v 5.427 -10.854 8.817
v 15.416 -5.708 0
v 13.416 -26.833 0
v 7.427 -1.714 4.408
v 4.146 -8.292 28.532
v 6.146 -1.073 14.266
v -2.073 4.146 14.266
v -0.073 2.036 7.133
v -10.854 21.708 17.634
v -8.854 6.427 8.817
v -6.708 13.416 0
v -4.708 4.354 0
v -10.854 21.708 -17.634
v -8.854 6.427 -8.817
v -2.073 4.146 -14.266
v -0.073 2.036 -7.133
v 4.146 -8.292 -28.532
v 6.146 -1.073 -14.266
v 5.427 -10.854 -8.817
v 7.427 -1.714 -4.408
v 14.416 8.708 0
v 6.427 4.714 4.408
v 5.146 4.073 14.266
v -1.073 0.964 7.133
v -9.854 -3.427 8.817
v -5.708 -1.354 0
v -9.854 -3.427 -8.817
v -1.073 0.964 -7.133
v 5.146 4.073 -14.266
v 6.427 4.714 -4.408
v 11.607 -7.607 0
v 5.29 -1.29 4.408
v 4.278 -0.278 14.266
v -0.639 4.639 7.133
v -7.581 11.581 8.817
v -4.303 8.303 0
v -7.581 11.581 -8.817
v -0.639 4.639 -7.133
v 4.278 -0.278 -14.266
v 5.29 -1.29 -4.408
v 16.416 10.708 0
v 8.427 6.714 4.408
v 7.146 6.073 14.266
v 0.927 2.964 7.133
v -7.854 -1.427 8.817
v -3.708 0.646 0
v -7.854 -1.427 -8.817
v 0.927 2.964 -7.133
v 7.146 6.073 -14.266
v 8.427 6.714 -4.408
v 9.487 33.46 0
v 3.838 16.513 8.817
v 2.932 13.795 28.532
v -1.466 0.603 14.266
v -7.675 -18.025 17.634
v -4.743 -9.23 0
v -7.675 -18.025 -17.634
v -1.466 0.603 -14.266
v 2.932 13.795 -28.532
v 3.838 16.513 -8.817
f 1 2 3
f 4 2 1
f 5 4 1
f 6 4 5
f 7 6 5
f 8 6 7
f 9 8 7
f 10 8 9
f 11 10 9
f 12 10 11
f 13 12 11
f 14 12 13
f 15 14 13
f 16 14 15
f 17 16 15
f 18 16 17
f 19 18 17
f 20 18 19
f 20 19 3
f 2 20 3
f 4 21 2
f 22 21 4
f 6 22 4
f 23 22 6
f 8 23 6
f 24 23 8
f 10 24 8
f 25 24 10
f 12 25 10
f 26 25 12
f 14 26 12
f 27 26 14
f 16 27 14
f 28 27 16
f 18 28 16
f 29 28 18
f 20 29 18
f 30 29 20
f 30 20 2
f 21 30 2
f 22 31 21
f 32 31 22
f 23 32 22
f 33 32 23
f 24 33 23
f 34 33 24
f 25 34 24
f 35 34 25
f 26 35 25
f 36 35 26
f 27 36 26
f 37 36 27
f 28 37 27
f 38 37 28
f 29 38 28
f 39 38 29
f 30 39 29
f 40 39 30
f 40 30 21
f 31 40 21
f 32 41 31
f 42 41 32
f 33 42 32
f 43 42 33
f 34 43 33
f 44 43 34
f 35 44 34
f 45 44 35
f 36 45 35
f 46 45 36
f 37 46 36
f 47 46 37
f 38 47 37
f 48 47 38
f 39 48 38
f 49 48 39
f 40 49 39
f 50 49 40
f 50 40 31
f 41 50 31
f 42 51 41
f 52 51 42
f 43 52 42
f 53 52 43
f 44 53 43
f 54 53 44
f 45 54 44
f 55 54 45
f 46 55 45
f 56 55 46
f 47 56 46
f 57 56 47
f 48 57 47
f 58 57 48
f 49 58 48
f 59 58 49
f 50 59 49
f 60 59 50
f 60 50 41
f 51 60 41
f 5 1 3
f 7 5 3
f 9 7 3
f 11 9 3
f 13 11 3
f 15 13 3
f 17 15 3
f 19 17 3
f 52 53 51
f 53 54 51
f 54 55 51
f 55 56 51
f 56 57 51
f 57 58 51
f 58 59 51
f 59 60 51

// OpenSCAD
polyhedron(faces = [[0, 10, 1], [1, 10, 11], [1, 11, 2], [2, 11, 12], [2, 12, 3], [3, 12, 13], [3, 13, 4], [4, 13, 14], [4, 14, 5], [5, 14, 15], [5, 15, 6], [6, 15, 16], [6, 16, 7], [7, 16, 17], [7, 17, 8], [8, 17, 18], [8, 18, 9], [9, 18, 19], [0, 9, 19], [0, 19, 10], [10, 20, 11], [11, 20, 21], [11, 21, 12], [12, 21, 22], [12, 22, 13], [13, 22, 23], [13, 23, 14], [14, 23, 24], [14, 24, 15], [15, 24, 25], [15, 25, 16], [16, 25, 26], [16, 26, 17], [17, 26, 27], [17, 27, 18], [18, 27, 28], [18, 28, 19], [19, 28, 29], [10, 19, 29], [10, 29, 20], [20, 30, 21], [21, 30, 31], [21, 31, 22], [22, 31, 32], [22, 32, 23], [23, 32, 33], [23, 33, 24], [24, 33, 34], [24, 34, 25], [25, 34, 35], [25, 35, 26], [26, 35, 36], [26, 36, 27], [27, 36, 37], [27, 37, 28], [28, 37, 38], [28, 38, 29], [29, 38, 39], [20, 29, 39], [20, 39, 30], [30, 40, 31], [31, 40, 41], [31, 41, 32], [32, 41, 42], [32, 42, 33], [33, 42, 43], [33, 43, 34], [34, 43, 44], [34, 44, 35], [35, 44, 45], [35, 45, 36], [36, 45, 46], [36, 46, 37], [37, 46, 47], [37, 47, 38], [38, 47, 48], [38, 48, 39], [39, 48, 49], [30, 39, 49], [30, 49, 40], [40, 50, 41], [41, 50, 51], [41, 51, 42], [42, 51, 52], [42, 52, 43], [43, 52, 53], [43, 53, 44], [44, 53, 54], [44, 54, 45], [45, 54, 55], [45, 55, 46], [46, 55, 56], [46, 56, 47], [47, 56, 57], [47, 57, 48], [48, 57, 58], [48, 58, 49], [49, 58, 59], [40, 49, 59], [40, 59, 50], [0, 1, 2], [0, 2, 3], [0, 3, 4], [0, 4, 5], [0, 5, 6], [0, 6, 7], [0, 7, 8], [0, 8, 9], [50, 52, 51], [50, 53, 52], [50, 54, 53], [50, 55, 54], [50, 56, 55], [50, 57, 56], [50, 58, 57], [50, 59, 58]], points = [[13.4164078650, -26.8328157300, 0.0000000000], [5.4270509831, -10.8541019662, 8.8167787844], [4.1458980338, -8.2917960675, 28.5316954889], [-2.0729490169, 4.1458980338, 14.2658477444], [-10.8541019662, 21.7082039325, 17.6335575688], [-6.7082039325, 13.4164078650, 0.0000000000], [-10.8541019662, 21.7082039325, -17.6335575688], [-2.0729490169, 4.1458980338, -14.2658477444], [4.1458980338, -8.2917960675, -28.5316954889], [5.4270509831, -10.8541019662, -8.8167787844], [15.4164078650, -5.7082039325, 0.0000000000], [7.4270509831, -1.7135254916, 4.4083893922], [6.1458980338, -1.0729490169, 14.2658477444], [-0.0729490169, 2.0364745084, 7.1329238722], [-8.8541019662, 6.4270509831, 8.8167787844], [-4.7082039325, 4.3541019662, 0.0000000000], [-8.8541019662, 6.4270509831, -8.8167787844], [-0.0729490169, 2.0364745084, -7.1329238722], [6.1458980338, -1.0729490169, -14.2658477444], [7.4270509831, -1.7135254916, -4.4083893922], [14.4164078650, 8.7082039325, 0.0000000000], [6.4270509831, 4.7135254916, 4.4083893922], [5.1458980338, 4.0729490169, 14.2658477444], [-1.0729490169, 0.9635254916, 7.1329238722], [-9.8541019662, -3.4270509831, 8.8167787844], [-5.7082039325, -1.3541019662, 0.0000000000], [-9.8541019662, -3.4270509831, -8.8167787844], [-1.0729490169, 0.9635254916, -7.1329238722], [5.1458980338, 4.0729490169, -14.2658477444], [6.4270509831, 4.7135254916, -4.4083893922], [11.6066017178, -7.6066017178, 0.0000000000], [5.2904605211, -1.2904605211, 4.4083893922], [4.2776201834, -0.2776201834, 14.2658477444], [-0.6388100917, 4.6388100917, 7.1329238722], [-7.5809210423, 11.5809210423, 8.8167787844], [-4.3033008589, 8.3033008589, 0.0000000000], [-7.5809210423, 11.5809210423, -8.8167787844], [-0.6388100917, 4.6388100917, -7.1329238722], [4.2776201834, -0.2776201834, -14.2658477444], [5.2904605211, -1.2904605211, -4.4083893922], [16.4164078650, 10.7082039325, 0.0000000000], [8.4270509831, 6.7135254916, 4.4083893922], [7.1458980338, 6.0729490169, 14.2658477444], [0.9270509831, 2.9635254916, 7.1329238722], [-7.8541019662, -1.4270509831, 8.8167787844], [-3.7082039325, 0.6458980338, 0.0000000000], [-7.8541019662, -1.4270509831, -8.8167787844], [0.9270509831, 2.9635254916, -7.1329238722], [7.1458980338, 6.0729490169, -14.2658477444], [8.4270509831, 6.7135254916, -4.4083893922], [9.4868329805, 33.4604989415, 0.0000000000], [3.8375045520, 16.5125136560, 8.8167787844], [2.9315926138, 13.7947778413, 28.5316954889], [-1.4657963069, 0.6026110793, 14.2658477444], [-7.6750091040, -18.0250273121, 17.6335575688], [-4.7434164903, -9.2302494708, 0.0000000000], [-7.6750091040, -18.0250273121, -17.6335575688], [-1.4657963069, 0.6026110793, -14.2658477444], [2.9315926138, 13.7947778413, -28.5316954889], [3.8375045520, 16.5125136560, -8.8167787844]]);
/***********************************************
*********      SolidPython code:      **********
************************************************
 
#! /usr/bin/env python
# -*- coding: UTF-8 -*-
from __future__ import division
import os
import sys
import re

# Assumes SolidPython is in site-packages or elsewhwere in sys.path
from solid import *
from solid.utils import *

SEGMENTS = 48


def sinusoidal_ring(rad=25, segments=SEGMENTS):
    outline = []
    for i in range(segments):
        angle = i * 360 / segments
        x = rad * cos(radians(angle))
        y = rad * sin(radians(angle))
        z = 2 * sin(radians(angle * 6))
        outline.append(Point3(x, y, z))
    return [[0,0],[2,1],[1,2],[1,3],[3,4],[0,5]]


def star(num_points=5, outer_rad=15, dip_factor=0.5):
    star_pts = []
    for i in range(2 * num_points):
        rad = outer_rad - i % 2 * dip_factor * outer_rad
        angle = radians(360 / (2 * num_points) * i)
        star_pts.append(Point3(rad * cos(angle), rad * sin(angle), 0))
    return star_pts


def extrude_example():

    # Note the incorrect triangulation at the two ends of the path.  This
    # is because star isn't convex, and the triangulation algorithm for
    # the two end caps only works for convex shapes.
    shape = star(num_points=5)
    path = sinusoidal_ring(rad=50)

    # If scale_factors aren't included, they'll default to
    # no scaling at each step along path.  Here, let's
    # make the shape twice as big at beginning and end of the path
    scales = [1] * len(path)
    scales[0] = 2
    scales[-1] = 2

    extruded = extrude_along_path(shape_pts=shape, path_pts=path, scale_factors=scales)

    return extruded

if __name__ == '__main__':
    out_dir = sys.argv[1] if len(sys.argv) > 1 else os.curdir
    file_out = os.path.join(out_dir, 'path_extrude_example.scad')

    a = extrude_example()

    print("%(__file__)s: SCAD file written to: \n%(file_out)s" % vars())
    scad_render_to_file(a, file_out, include_orig_code=True) 
 
************************************************/
